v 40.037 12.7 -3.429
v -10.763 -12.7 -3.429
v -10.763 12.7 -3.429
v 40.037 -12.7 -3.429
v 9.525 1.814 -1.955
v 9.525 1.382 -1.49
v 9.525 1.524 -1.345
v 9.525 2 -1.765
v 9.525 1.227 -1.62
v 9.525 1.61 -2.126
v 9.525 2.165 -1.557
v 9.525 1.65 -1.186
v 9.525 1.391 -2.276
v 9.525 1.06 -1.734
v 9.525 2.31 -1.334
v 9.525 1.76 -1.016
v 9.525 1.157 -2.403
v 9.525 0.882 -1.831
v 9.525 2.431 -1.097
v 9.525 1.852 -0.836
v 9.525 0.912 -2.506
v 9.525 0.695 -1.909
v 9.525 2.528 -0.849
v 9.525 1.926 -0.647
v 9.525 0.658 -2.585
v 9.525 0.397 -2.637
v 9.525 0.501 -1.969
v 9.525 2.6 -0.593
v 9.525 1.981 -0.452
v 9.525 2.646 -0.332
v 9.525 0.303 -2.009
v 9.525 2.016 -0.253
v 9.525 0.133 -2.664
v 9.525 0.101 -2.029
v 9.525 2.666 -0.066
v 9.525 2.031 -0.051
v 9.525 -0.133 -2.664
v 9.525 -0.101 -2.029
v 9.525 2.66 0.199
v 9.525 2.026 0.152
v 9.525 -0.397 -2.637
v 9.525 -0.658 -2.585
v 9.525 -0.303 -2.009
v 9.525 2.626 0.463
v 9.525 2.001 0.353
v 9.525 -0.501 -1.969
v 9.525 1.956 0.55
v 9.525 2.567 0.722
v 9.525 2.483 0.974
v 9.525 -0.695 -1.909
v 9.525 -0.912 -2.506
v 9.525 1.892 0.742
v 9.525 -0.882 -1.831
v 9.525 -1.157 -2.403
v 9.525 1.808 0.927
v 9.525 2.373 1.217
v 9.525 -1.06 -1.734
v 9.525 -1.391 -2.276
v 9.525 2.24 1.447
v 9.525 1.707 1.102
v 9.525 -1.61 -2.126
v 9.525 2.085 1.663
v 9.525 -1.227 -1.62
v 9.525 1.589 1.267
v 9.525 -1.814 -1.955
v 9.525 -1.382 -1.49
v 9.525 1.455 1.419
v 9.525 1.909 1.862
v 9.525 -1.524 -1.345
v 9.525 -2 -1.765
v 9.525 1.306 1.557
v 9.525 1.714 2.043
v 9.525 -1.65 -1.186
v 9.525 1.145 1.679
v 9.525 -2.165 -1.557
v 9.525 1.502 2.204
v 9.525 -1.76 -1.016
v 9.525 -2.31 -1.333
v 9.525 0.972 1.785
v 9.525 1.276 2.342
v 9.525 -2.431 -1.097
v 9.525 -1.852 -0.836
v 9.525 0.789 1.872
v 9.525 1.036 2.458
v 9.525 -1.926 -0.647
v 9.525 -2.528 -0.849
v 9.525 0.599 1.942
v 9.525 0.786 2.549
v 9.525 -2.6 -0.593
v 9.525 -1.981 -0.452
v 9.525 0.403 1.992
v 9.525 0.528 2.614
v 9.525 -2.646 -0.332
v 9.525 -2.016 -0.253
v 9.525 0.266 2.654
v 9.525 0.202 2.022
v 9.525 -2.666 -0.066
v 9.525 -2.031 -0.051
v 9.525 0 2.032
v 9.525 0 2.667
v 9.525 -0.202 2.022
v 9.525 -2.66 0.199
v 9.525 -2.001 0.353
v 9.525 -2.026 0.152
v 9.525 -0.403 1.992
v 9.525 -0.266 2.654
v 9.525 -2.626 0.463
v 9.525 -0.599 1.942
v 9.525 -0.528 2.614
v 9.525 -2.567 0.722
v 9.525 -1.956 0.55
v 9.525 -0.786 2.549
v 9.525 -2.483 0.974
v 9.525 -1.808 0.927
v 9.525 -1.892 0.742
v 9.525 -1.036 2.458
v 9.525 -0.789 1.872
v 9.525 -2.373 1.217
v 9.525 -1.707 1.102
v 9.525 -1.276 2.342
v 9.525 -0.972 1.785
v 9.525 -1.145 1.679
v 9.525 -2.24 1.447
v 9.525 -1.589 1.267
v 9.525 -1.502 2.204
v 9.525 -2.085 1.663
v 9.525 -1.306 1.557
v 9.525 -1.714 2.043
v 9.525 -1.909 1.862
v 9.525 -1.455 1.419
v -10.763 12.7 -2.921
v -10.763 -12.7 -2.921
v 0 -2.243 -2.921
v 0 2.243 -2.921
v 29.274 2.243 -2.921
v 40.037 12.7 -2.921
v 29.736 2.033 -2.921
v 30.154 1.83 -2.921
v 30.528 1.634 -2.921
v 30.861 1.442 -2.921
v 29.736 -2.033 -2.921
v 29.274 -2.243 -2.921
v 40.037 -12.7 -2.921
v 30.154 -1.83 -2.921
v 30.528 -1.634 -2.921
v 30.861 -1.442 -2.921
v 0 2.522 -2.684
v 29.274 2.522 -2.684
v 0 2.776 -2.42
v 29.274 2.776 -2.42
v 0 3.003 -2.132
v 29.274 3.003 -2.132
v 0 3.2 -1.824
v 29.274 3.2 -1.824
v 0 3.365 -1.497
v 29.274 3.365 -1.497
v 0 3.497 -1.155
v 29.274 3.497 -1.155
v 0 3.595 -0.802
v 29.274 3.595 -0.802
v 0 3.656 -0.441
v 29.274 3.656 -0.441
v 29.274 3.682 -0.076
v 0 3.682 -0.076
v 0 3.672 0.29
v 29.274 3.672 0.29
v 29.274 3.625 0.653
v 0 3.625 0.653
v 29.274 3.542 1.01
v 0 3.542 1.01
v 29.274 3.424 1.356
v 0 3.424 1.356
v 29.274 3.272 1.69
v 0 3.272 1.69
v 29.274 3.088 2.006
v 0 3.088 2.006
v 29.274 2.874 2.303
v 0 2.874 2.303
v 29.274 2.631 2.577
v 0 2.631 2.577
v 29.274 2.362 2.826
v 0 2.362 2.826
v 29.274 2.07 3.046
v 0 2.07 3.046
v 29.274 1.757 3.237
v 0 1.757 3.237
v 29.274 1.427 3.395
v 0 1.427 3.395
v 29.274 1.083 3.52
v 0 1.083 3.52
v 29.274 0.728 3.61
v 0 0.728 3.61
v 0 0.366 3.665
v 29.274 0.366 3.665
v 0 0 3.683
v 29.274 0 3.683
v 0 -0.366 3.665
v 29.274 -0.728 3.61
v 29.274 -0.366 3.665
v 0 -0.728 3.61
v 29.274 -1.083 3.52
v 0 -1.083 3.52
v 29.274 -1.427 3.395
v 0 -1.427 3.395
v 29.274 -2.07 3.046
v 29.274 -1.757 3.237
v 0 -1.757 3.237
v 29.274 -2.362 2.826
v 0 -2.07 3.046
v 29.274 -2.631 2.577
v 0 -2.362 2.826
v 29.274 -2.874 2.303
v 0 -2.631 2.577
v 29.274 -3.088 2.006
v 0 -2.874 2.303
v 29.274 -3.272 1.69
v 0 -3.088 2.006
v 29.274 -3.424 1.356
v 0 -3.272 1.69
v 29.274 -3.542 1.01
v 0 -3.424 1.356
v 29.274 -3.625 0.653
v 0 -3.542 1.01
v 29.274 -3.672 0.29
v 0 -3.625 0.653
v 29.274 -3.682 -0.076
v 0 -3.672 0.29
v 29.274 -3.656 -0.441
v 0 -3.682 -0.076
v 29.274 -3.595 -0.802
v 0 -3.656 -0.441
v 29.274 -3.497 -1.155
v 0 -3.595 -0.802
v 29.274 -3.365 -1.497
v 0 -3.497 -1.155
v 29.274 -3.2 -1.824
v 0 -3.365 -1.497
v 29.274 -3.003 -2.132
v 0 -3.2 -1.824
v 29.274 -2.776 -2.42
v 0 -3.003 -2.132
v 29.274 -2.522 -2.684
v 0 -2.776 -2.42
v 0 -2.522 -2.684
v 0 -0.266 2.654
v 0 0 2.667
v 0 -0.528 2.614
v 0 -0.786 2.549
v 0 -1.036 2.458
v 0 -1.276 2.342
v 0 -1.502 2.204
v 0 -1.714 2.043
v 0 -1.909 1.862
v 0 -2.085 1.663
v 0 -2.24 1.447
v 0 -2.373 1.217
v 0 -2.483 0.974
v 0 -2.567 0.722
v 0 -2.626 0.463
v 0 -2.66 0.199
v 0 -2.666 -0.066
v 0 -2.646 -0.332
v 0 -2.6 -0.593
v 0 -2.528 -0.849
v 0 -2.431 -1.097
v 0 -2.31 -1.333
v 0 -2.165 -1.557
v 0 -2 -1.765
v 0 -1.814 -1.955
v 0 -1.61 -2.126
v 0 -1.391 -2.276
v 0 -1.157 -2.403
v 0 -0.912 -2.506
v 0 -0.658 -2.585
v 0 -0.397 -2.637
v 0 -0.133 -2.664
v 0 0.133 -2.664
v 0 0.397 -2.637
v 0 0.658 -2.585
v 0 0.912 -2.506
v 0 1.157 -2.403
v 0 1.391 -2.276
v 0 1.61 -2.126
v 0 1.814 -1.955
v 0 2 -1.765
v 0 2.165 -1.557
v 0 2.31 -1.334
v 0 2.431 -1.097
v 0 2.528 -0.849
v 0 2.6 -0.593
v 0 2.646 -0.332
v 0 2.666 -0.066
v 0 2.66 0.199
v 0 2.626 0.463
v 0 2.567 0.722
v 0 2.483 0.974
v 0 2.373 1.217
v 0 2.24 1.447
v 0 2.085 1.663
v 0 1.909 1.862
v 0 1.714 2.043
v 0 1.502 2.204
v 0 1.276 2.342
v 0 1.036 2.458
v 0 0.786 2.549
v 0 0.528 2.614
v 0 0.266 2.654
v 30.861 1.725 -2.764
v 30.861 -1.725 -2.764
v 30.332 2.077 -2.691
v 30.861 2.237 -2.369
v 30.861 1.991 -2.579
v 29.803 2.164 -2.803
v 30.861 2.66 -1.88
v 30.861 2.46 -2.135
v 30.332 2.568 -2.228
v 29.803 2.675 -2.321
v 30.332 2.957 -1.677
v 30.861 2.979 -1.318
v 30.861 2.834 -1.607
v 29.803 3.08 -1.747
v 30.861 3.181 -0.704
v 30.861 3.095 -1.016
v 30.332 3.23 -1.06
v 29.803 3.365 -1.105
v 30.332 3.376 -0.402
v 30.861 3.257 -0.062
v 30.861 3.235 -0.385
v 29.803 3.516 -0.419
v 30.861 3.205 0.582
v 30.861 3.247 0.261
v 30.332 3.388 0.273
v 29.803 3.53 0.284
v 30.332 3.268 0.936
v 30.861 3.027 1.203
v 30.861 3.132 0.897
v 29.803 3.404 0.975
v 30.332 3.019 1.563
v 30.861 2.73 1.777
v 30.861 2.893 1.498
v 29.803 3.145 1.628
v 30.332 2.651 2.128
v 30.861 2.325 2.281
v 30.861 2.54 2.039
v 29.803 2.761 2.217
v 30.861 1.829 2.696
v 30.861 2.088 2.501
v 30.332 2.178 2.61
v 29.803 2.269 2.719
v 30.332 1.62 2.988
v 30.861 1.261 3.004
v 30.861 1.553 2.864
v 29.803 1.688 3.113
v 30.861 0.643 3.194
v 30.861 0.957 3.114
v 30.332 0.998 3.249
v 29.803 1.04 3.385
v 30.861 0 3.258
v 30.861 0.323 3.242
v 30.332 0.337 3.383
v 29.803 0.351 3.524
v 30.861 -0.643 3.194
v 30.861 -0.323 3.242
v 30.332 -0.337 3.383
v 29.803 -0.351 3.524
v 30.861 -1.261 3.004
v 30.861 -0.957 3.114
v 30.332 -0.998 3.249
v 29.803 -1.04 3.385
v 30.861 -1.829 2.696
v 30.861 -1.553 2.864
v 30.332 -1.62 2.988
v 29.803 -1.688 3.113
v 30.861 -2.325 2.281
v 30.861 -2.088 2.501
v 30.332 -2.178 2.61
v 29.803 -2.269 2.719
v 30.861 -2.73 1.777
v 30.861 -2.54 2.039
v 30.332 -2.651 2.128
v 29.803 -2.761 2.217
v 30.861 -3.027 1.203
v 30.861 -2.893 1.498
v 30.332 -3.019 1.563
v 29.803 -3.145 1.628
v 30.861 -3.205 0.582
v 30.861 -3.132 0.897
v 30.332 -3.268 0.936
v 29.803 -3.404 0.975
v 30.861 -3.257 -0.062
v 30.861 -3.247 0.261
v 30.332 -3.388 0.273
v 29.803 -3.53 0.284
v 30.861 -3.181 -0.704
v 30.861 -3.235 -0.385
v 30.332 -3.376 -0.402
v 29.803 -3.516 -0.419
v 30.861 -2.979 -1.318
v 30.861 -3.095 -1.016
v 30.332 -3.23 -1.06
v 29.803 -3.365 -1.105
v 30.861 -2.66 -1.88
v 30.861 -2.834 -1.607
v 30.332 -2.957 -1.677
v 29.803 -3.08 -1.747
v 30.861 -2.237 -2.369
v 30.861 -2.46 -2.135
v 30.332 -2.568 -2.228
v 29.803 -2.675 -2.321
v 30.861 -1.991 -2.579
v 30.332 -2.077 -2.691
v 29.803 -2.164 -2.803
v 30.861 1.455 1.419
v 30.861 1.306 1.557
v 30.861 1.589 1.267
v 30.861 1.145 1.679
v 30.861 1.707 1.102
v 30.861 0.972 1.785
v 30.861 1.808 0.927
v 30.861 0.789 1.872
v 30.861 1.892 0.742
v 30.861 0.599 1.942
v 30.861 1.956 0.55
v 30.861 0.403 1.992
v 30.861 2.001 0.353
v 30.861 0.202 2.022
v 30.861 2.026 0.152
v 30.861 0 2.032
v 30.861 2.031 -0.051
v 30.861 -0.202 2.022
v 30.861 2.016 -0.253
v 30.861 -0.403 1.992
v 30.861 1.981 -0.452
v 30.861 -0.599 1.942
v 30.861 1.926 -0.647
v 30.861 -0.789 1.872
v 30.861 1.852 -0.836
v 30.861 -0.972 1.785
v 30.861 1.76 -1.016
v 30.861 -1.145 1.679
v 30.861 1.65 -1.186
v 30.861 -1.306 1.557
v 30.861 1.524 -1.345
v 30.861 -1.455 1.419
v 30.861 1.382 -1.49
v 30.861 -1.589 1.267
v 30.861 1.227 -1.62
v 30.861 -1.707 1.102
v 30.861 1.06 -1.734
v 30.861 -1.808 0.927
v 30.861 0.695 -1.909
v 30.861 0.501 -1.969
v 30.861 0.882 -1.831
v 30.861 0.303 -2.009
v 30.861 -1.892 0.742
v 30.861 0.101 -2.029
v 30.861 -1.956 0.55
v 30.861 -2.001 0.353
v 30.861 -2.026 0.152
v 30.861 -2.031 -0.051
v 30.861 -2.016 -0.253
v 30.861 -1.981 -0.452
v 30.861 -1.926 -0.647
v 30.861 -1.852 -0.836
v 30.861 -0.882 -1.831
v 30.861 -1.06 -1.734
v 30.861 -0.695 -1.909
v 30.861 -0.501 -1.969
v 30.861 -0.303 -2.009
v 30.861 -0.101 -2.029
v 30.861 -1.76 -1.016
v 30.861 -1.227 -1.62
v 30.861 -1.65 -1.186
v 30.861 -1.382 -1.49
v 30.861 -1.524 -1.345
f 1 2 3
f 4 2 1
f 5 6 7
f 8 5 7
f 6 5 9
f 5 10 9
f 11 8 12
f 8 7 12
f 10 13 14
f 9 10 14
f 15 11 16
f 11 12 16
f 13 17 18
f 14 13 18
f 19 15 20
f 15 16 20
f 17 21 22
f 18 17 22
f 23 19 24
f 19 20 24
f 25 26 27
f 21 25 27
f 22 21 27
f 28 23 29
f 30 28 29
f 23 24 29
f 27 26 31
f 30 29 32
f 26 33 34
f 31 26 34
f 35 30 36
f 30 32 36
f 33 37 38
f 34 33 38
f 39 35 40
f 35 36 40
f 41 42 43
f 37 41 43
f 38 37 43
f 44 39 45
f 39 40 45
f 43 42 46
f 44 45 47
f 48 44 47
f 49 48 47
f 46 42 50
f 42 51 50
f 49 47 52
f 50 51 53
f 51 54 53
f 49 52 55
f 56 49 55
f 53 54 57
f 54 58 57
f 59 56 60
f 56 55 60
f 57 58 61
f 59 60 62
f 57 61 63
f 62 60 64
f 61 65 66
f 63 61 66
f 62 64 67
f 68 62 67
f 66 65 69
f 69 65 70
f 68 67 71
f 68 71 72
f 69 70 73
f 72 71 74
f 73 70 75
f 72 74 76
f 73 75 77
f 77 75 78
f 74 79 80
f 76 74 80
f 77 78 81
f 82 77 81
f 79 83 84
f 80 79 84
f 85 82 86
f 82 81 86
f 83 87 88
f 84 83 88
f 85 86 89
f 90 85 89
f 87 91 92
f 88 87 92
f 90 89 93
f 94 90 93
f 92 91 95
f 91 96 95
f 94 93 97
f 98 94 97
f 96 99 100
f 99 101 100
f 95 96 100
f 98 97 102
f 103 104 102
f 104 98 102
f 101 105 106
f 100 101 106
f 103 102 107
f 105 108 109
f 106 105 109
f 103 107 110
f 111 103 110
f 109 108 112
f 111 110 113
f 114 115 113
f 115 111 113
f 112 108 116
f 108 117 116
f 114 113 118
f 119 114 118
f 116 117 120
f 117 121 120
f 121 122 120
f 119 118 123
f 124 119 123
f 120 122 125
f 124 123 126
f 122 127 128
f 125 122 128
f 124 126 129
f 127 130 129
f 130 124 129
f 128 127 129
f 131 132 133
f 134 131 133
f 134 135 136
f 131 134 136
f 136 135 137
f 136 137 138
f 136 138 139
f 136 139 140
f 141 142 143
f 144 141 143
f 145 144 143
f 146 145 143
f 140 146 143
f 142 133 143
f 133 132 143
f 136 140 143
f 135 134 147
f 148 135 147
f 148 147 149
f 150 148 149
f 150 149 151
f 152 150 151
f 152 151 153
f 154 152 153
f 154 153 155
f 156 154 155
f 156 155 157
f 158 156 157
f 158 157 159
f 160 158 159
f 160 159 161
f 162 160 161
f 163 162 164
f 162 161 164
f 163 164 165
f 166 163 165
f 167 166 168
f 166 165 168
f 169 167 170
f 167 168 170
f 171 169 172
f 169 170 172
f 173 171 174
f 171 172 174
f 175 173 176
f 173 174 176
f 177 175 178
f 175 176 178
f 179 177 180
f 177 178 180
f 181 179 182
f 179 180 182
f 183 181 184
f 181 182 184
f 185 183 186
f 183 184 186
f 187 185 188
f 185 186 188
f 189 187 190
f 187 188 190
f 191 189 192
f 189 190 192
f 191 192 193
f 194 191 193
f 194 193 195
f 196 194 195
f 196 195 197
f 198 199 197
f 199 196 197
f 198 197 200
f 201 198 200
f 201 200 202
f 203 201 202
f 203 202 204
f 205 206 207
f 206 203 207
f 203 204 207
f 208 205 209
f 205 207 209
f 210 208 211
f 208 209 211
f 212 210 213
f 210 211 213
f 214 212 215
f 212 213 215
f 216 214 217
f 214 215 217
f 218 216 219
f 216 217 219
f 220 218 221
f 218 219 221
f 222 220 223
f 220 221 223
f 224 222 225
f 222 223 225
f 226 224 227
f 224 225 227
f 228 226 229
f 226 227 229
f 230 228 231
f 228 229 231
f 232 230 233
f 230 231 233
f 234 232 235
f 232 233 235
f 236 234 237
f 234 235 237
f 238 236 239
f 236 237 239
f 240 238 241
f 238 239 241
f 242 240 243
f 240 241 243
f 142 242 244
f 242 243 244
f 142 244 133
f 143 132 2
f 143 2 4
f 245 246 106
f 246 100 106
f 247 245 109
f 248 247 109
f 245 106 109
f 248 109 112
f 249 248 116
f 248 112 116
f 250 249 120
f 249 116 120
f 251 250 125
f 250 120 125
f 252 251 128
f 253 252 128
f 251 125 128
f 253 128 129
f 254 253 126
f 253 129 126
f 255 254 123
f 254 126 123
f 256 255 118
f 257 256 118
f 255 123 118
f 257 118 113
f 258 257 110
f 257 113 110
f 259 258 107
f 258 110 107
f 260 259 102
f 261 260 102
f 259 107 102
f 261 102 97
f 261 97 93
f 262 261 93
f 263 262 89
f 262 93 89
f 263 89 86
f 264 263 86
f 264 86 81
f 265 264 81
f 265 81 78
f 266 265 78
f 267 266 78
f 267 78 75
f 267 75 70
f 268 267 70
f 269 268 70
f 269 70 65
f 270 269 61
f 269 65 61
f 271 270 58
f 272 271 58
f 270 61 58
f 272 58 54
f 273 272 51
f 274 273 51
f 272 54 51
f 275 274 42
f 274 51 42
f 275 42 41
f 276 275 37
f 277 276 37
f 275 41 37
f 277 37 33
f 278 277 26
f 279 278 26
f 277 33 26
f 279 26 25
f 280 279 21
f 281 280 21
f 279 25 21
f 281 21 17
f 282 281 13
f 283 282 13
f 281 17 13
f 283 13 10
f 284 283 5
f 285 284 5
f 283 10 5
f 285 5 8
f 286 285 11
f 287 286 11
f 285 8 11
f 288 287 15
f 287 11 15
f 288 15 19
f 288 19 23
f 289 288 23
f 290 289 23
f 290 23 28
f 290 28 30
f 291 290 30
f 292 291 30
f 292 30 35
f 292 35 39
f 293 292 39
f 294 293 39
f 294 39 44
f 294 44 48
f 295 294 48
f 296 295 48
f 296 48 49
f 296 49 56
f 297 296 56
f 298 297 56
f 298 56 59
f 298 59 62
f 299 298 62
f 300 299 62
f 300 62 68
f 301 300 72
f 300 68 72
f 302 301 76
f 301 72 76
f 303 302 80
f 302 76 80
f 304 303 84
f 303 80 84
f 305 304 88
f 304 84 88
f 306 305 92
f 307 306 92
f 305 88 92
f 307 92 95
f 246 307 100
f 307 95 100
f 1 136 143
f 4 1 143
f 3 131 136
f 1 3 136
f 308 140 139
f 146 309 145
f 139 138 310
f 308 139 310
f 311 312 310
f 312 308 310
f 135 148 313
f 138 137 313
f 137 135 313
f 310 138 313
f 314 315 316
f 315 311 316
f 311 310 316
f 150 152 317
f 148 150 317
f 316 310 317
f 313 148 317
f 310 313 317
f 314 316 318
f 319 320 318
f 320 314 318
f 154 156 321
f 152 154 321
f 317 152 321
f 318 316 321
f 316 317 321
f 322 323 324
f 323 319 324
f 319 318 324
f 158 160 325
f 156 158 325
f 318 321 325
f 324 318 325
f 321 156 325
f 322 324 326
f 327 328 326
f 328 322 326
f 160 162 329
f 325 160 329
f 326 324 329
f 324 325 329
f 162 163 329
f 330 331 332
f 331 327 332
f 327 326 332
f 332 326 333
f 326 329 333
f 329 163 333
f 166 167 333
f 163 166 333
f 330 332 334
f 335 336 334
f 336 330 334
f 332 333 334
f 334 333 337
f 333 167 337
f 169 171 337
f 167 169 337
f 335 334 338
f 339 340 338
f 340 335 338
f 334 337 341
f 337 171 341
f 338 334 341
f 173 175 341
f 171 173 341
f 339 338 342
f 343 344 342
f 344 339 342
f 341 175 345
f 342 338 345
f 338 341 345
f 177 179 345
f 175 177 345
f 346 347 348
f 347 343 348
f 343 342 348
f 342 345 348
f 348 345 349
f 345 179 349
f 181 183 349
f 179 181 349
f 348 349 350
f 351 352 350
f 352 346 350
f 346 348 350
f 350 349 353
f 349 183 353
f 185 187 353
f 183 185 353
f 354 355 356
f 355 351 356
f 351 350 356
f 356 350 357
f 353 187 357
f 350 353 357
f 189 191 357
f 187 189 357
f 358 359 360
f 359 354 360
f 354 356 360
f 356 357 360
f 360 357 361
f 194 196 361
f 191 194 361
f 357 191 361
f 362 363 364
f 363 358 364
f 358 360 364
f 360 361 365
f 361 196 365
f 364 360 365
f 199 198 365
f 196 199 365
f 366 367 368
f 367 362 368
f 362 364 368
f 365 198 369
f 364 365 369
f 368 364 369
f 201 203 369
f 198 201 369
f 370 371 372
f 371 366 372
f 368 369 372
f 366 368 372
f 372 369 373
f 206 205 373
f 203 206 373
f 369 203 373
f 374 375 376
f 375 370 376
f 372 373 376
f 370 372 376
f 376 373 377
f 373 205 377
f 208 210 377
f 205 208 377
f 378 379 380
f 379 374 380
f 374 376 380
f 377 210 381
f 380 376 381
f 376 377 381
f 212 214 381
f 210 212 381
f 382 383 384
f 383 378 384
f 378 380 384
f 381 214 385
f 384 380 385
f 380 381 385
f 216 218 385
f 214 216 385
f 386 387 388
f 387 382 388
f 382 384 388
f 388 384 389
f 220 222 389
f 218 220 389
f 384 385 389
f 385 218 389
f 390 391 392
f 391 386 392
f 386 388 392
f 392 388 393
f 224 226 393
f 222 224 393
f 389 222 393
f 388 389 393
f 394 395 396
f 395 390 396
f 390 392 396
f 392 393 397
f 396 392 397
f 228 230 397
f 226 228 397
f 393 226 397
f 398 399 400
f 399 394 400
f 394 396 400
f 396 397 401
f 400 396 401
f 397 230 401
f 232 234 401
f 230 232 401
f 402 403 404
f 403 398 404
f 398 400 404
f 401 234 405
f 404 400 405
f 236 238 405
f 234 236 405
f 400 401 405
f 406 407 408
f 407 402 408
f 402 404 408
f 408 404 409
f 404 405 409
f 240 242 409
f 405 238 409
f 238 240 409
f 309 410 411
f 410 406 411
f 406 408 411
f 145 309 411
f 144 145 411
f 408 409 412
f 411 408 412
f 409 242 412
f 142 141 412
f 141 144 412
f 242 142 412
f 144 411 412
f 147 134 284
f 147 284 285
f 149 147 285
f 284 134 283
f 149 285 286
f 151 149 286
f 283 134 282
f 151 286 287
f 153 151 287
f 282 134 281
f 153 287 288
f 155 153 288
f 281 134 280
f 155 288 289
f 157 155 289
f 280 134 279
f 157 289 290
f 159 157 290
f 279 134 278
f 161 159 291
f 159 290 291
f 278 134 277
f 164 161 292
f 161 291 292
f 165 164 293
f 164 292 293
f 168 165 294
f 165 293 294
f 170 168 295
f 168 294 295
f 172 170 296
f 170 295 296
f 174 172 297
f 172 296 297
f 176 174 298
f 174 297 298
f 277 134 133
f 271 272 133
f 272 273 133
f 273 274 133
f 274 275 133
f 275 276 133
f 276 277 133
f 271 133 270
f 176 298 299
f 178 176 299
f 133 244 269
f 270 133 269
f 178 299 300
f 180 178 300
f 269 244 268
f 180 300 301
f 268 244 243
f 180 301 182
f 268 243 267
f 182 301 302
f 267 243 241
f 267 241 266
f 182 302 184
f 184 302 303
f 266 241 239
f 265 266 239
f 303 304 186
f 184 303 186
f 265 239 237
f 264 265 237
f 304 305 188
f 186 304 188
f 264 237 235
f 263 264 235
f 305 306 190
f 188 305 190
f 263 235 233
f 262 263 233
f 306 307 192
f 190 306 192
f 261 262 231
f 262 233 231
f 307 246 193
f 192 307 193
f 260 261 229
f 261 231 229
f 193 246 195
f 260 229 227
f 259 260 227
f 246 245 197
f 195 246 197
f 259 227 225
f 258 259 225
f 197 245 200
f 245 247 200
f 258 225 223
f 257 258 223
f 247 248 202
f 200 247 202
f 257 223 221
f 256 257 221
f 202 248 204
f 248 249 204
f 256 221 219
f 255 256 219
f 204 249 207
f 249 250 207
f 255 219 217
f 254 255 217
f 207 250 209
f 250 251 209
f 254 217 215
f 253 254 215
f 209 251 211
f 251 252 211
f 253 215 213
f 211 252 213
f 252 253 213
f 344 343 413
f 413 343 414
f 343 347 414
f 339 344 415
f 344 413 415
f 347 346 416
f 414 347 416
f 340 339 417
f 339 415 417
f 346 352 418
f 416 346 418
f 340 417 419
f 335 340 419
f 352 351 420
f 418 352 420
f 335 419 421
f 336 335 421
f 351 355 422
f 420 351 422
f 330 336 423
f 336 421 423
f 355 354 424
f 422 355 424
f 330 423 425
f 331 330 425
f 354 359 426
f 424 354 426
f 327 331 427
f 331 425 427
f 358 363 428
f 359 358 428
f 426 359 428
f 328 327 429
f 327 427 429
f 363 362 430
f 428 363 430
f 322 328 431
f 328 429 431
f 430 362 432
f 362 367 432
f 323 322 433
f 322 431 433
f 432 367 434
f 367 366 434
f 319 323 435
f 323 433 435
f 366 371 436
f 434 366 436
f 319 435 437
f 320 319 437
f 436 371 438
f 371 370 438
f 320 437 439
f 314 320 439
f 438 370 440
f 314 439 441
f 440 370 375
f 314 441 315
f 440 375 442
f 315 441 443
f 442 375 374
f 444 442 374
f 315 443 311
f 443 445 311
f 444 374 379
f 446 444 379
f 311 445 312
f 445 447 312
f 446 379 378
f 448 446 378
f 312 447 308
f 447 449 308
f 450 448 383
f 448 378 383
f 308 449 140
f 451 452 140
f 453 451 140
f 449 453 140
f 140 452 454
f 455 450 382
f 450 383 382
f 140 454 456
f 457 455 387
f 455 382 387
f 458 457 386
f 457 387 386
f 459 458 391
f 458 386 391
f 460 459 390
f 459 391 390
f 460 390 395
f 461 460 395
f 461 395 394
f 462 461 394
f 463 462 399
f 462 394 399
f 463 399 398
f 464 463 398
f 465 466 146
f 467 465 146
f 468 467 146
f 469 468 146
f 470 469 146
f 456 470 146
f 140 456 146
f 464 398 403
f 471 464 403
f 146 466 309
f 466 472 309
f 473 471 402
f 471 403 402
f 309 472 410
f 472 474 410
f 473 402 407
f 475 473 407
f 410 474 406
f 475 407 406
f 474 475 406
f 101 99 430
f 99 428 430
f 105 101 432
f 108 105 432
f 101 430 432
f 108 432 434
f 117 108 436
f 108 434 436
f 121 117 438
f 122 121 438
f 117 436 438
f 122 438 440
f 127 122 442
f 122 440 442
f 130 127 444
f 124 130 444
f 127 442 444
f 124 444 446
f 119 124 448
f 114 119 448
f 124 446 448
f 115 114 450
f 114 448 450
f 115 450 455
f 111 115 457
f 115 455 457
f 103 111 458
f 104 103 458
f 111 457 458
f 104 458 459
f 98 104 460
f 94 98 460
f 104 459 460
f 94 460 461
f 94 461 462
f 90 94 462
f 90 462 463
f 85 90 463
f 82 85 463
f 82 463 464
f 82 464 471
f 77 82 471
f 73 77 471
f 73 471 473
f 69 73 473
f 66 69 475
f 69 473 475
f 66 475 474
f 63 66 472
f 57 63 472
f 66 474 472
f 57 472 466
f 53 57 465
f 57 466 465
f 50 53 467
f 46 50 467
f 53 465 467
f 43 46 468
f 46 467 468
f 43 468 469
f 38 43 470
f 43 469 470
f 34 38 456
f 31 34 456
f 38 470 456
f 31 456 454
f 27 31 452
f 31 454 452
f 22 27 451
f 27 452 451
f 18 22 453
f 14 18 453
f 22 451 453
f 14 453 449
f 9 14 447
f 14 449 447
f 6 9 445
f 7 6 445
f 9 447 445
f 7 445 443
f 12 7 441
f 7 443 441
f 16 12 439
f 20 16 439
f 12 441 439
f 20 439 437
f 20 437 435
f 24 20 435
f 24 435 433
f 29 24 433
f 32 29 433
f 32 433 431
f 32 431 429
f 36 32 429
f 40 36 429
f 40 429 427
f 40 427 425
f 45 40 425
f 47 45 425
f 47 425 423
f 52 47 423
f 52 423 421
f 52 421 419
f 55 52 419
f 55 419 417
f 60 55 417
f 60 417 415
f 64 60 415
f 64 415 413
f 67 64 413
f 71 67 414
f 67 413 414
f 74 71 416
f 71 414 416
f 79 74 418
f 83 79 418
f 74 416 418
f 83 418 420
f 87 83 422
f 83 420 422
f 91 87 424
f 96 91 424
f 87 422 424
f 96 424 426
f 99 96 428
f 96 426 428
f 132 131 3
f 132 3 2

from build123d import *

# Parameters (mm, degrees)
F2_W     = 4.486534
F2_H     = 0.762
F3_DEPTH = 30.862
F4_W     = 50.8
F4_H     = 25.4
F5_DEPTH = 0.508


with BuildPart() as f1:
    # F0 (on Front) → F1 (revolve)
    with BuildSketch(Plane.XZ):
        Polygon((0, 3.683), (0, 2.667), (9.525, 2.667), (9.525, 2.032), (30.861, 2.032), (30.861, 3.257631), (29.2735, 3.683), align=None)
    revolve(axis=Axis((17.153487, 0, 0), (1, 0, 0)))

    # F2 (on face) → F3 (cut, through all)
    with BuildSketch(Plane(origin=(0, 0, 0), x_dir=(0, -1, 0), z_dir=(-1, 0, 0))):
        with Locations((0, -3.302)):
            Rectangle(F2_W, F2_H)
    extrude(amount=-F3_DEPTH, mode=Mode.SUBTRACT)

    # F4 (on face) → F5 (join)
    with BuildSketch(Plane(origin=(0, 0, -2.921), x_dir=(1, 0, 0), z_dir=(0, 0, -1))):
        with Locations((14.63675, 0)):
            Rectangle(F4_W, F4_H)
    extrude(amount=F5_DEPTH)


solid = f1.part
